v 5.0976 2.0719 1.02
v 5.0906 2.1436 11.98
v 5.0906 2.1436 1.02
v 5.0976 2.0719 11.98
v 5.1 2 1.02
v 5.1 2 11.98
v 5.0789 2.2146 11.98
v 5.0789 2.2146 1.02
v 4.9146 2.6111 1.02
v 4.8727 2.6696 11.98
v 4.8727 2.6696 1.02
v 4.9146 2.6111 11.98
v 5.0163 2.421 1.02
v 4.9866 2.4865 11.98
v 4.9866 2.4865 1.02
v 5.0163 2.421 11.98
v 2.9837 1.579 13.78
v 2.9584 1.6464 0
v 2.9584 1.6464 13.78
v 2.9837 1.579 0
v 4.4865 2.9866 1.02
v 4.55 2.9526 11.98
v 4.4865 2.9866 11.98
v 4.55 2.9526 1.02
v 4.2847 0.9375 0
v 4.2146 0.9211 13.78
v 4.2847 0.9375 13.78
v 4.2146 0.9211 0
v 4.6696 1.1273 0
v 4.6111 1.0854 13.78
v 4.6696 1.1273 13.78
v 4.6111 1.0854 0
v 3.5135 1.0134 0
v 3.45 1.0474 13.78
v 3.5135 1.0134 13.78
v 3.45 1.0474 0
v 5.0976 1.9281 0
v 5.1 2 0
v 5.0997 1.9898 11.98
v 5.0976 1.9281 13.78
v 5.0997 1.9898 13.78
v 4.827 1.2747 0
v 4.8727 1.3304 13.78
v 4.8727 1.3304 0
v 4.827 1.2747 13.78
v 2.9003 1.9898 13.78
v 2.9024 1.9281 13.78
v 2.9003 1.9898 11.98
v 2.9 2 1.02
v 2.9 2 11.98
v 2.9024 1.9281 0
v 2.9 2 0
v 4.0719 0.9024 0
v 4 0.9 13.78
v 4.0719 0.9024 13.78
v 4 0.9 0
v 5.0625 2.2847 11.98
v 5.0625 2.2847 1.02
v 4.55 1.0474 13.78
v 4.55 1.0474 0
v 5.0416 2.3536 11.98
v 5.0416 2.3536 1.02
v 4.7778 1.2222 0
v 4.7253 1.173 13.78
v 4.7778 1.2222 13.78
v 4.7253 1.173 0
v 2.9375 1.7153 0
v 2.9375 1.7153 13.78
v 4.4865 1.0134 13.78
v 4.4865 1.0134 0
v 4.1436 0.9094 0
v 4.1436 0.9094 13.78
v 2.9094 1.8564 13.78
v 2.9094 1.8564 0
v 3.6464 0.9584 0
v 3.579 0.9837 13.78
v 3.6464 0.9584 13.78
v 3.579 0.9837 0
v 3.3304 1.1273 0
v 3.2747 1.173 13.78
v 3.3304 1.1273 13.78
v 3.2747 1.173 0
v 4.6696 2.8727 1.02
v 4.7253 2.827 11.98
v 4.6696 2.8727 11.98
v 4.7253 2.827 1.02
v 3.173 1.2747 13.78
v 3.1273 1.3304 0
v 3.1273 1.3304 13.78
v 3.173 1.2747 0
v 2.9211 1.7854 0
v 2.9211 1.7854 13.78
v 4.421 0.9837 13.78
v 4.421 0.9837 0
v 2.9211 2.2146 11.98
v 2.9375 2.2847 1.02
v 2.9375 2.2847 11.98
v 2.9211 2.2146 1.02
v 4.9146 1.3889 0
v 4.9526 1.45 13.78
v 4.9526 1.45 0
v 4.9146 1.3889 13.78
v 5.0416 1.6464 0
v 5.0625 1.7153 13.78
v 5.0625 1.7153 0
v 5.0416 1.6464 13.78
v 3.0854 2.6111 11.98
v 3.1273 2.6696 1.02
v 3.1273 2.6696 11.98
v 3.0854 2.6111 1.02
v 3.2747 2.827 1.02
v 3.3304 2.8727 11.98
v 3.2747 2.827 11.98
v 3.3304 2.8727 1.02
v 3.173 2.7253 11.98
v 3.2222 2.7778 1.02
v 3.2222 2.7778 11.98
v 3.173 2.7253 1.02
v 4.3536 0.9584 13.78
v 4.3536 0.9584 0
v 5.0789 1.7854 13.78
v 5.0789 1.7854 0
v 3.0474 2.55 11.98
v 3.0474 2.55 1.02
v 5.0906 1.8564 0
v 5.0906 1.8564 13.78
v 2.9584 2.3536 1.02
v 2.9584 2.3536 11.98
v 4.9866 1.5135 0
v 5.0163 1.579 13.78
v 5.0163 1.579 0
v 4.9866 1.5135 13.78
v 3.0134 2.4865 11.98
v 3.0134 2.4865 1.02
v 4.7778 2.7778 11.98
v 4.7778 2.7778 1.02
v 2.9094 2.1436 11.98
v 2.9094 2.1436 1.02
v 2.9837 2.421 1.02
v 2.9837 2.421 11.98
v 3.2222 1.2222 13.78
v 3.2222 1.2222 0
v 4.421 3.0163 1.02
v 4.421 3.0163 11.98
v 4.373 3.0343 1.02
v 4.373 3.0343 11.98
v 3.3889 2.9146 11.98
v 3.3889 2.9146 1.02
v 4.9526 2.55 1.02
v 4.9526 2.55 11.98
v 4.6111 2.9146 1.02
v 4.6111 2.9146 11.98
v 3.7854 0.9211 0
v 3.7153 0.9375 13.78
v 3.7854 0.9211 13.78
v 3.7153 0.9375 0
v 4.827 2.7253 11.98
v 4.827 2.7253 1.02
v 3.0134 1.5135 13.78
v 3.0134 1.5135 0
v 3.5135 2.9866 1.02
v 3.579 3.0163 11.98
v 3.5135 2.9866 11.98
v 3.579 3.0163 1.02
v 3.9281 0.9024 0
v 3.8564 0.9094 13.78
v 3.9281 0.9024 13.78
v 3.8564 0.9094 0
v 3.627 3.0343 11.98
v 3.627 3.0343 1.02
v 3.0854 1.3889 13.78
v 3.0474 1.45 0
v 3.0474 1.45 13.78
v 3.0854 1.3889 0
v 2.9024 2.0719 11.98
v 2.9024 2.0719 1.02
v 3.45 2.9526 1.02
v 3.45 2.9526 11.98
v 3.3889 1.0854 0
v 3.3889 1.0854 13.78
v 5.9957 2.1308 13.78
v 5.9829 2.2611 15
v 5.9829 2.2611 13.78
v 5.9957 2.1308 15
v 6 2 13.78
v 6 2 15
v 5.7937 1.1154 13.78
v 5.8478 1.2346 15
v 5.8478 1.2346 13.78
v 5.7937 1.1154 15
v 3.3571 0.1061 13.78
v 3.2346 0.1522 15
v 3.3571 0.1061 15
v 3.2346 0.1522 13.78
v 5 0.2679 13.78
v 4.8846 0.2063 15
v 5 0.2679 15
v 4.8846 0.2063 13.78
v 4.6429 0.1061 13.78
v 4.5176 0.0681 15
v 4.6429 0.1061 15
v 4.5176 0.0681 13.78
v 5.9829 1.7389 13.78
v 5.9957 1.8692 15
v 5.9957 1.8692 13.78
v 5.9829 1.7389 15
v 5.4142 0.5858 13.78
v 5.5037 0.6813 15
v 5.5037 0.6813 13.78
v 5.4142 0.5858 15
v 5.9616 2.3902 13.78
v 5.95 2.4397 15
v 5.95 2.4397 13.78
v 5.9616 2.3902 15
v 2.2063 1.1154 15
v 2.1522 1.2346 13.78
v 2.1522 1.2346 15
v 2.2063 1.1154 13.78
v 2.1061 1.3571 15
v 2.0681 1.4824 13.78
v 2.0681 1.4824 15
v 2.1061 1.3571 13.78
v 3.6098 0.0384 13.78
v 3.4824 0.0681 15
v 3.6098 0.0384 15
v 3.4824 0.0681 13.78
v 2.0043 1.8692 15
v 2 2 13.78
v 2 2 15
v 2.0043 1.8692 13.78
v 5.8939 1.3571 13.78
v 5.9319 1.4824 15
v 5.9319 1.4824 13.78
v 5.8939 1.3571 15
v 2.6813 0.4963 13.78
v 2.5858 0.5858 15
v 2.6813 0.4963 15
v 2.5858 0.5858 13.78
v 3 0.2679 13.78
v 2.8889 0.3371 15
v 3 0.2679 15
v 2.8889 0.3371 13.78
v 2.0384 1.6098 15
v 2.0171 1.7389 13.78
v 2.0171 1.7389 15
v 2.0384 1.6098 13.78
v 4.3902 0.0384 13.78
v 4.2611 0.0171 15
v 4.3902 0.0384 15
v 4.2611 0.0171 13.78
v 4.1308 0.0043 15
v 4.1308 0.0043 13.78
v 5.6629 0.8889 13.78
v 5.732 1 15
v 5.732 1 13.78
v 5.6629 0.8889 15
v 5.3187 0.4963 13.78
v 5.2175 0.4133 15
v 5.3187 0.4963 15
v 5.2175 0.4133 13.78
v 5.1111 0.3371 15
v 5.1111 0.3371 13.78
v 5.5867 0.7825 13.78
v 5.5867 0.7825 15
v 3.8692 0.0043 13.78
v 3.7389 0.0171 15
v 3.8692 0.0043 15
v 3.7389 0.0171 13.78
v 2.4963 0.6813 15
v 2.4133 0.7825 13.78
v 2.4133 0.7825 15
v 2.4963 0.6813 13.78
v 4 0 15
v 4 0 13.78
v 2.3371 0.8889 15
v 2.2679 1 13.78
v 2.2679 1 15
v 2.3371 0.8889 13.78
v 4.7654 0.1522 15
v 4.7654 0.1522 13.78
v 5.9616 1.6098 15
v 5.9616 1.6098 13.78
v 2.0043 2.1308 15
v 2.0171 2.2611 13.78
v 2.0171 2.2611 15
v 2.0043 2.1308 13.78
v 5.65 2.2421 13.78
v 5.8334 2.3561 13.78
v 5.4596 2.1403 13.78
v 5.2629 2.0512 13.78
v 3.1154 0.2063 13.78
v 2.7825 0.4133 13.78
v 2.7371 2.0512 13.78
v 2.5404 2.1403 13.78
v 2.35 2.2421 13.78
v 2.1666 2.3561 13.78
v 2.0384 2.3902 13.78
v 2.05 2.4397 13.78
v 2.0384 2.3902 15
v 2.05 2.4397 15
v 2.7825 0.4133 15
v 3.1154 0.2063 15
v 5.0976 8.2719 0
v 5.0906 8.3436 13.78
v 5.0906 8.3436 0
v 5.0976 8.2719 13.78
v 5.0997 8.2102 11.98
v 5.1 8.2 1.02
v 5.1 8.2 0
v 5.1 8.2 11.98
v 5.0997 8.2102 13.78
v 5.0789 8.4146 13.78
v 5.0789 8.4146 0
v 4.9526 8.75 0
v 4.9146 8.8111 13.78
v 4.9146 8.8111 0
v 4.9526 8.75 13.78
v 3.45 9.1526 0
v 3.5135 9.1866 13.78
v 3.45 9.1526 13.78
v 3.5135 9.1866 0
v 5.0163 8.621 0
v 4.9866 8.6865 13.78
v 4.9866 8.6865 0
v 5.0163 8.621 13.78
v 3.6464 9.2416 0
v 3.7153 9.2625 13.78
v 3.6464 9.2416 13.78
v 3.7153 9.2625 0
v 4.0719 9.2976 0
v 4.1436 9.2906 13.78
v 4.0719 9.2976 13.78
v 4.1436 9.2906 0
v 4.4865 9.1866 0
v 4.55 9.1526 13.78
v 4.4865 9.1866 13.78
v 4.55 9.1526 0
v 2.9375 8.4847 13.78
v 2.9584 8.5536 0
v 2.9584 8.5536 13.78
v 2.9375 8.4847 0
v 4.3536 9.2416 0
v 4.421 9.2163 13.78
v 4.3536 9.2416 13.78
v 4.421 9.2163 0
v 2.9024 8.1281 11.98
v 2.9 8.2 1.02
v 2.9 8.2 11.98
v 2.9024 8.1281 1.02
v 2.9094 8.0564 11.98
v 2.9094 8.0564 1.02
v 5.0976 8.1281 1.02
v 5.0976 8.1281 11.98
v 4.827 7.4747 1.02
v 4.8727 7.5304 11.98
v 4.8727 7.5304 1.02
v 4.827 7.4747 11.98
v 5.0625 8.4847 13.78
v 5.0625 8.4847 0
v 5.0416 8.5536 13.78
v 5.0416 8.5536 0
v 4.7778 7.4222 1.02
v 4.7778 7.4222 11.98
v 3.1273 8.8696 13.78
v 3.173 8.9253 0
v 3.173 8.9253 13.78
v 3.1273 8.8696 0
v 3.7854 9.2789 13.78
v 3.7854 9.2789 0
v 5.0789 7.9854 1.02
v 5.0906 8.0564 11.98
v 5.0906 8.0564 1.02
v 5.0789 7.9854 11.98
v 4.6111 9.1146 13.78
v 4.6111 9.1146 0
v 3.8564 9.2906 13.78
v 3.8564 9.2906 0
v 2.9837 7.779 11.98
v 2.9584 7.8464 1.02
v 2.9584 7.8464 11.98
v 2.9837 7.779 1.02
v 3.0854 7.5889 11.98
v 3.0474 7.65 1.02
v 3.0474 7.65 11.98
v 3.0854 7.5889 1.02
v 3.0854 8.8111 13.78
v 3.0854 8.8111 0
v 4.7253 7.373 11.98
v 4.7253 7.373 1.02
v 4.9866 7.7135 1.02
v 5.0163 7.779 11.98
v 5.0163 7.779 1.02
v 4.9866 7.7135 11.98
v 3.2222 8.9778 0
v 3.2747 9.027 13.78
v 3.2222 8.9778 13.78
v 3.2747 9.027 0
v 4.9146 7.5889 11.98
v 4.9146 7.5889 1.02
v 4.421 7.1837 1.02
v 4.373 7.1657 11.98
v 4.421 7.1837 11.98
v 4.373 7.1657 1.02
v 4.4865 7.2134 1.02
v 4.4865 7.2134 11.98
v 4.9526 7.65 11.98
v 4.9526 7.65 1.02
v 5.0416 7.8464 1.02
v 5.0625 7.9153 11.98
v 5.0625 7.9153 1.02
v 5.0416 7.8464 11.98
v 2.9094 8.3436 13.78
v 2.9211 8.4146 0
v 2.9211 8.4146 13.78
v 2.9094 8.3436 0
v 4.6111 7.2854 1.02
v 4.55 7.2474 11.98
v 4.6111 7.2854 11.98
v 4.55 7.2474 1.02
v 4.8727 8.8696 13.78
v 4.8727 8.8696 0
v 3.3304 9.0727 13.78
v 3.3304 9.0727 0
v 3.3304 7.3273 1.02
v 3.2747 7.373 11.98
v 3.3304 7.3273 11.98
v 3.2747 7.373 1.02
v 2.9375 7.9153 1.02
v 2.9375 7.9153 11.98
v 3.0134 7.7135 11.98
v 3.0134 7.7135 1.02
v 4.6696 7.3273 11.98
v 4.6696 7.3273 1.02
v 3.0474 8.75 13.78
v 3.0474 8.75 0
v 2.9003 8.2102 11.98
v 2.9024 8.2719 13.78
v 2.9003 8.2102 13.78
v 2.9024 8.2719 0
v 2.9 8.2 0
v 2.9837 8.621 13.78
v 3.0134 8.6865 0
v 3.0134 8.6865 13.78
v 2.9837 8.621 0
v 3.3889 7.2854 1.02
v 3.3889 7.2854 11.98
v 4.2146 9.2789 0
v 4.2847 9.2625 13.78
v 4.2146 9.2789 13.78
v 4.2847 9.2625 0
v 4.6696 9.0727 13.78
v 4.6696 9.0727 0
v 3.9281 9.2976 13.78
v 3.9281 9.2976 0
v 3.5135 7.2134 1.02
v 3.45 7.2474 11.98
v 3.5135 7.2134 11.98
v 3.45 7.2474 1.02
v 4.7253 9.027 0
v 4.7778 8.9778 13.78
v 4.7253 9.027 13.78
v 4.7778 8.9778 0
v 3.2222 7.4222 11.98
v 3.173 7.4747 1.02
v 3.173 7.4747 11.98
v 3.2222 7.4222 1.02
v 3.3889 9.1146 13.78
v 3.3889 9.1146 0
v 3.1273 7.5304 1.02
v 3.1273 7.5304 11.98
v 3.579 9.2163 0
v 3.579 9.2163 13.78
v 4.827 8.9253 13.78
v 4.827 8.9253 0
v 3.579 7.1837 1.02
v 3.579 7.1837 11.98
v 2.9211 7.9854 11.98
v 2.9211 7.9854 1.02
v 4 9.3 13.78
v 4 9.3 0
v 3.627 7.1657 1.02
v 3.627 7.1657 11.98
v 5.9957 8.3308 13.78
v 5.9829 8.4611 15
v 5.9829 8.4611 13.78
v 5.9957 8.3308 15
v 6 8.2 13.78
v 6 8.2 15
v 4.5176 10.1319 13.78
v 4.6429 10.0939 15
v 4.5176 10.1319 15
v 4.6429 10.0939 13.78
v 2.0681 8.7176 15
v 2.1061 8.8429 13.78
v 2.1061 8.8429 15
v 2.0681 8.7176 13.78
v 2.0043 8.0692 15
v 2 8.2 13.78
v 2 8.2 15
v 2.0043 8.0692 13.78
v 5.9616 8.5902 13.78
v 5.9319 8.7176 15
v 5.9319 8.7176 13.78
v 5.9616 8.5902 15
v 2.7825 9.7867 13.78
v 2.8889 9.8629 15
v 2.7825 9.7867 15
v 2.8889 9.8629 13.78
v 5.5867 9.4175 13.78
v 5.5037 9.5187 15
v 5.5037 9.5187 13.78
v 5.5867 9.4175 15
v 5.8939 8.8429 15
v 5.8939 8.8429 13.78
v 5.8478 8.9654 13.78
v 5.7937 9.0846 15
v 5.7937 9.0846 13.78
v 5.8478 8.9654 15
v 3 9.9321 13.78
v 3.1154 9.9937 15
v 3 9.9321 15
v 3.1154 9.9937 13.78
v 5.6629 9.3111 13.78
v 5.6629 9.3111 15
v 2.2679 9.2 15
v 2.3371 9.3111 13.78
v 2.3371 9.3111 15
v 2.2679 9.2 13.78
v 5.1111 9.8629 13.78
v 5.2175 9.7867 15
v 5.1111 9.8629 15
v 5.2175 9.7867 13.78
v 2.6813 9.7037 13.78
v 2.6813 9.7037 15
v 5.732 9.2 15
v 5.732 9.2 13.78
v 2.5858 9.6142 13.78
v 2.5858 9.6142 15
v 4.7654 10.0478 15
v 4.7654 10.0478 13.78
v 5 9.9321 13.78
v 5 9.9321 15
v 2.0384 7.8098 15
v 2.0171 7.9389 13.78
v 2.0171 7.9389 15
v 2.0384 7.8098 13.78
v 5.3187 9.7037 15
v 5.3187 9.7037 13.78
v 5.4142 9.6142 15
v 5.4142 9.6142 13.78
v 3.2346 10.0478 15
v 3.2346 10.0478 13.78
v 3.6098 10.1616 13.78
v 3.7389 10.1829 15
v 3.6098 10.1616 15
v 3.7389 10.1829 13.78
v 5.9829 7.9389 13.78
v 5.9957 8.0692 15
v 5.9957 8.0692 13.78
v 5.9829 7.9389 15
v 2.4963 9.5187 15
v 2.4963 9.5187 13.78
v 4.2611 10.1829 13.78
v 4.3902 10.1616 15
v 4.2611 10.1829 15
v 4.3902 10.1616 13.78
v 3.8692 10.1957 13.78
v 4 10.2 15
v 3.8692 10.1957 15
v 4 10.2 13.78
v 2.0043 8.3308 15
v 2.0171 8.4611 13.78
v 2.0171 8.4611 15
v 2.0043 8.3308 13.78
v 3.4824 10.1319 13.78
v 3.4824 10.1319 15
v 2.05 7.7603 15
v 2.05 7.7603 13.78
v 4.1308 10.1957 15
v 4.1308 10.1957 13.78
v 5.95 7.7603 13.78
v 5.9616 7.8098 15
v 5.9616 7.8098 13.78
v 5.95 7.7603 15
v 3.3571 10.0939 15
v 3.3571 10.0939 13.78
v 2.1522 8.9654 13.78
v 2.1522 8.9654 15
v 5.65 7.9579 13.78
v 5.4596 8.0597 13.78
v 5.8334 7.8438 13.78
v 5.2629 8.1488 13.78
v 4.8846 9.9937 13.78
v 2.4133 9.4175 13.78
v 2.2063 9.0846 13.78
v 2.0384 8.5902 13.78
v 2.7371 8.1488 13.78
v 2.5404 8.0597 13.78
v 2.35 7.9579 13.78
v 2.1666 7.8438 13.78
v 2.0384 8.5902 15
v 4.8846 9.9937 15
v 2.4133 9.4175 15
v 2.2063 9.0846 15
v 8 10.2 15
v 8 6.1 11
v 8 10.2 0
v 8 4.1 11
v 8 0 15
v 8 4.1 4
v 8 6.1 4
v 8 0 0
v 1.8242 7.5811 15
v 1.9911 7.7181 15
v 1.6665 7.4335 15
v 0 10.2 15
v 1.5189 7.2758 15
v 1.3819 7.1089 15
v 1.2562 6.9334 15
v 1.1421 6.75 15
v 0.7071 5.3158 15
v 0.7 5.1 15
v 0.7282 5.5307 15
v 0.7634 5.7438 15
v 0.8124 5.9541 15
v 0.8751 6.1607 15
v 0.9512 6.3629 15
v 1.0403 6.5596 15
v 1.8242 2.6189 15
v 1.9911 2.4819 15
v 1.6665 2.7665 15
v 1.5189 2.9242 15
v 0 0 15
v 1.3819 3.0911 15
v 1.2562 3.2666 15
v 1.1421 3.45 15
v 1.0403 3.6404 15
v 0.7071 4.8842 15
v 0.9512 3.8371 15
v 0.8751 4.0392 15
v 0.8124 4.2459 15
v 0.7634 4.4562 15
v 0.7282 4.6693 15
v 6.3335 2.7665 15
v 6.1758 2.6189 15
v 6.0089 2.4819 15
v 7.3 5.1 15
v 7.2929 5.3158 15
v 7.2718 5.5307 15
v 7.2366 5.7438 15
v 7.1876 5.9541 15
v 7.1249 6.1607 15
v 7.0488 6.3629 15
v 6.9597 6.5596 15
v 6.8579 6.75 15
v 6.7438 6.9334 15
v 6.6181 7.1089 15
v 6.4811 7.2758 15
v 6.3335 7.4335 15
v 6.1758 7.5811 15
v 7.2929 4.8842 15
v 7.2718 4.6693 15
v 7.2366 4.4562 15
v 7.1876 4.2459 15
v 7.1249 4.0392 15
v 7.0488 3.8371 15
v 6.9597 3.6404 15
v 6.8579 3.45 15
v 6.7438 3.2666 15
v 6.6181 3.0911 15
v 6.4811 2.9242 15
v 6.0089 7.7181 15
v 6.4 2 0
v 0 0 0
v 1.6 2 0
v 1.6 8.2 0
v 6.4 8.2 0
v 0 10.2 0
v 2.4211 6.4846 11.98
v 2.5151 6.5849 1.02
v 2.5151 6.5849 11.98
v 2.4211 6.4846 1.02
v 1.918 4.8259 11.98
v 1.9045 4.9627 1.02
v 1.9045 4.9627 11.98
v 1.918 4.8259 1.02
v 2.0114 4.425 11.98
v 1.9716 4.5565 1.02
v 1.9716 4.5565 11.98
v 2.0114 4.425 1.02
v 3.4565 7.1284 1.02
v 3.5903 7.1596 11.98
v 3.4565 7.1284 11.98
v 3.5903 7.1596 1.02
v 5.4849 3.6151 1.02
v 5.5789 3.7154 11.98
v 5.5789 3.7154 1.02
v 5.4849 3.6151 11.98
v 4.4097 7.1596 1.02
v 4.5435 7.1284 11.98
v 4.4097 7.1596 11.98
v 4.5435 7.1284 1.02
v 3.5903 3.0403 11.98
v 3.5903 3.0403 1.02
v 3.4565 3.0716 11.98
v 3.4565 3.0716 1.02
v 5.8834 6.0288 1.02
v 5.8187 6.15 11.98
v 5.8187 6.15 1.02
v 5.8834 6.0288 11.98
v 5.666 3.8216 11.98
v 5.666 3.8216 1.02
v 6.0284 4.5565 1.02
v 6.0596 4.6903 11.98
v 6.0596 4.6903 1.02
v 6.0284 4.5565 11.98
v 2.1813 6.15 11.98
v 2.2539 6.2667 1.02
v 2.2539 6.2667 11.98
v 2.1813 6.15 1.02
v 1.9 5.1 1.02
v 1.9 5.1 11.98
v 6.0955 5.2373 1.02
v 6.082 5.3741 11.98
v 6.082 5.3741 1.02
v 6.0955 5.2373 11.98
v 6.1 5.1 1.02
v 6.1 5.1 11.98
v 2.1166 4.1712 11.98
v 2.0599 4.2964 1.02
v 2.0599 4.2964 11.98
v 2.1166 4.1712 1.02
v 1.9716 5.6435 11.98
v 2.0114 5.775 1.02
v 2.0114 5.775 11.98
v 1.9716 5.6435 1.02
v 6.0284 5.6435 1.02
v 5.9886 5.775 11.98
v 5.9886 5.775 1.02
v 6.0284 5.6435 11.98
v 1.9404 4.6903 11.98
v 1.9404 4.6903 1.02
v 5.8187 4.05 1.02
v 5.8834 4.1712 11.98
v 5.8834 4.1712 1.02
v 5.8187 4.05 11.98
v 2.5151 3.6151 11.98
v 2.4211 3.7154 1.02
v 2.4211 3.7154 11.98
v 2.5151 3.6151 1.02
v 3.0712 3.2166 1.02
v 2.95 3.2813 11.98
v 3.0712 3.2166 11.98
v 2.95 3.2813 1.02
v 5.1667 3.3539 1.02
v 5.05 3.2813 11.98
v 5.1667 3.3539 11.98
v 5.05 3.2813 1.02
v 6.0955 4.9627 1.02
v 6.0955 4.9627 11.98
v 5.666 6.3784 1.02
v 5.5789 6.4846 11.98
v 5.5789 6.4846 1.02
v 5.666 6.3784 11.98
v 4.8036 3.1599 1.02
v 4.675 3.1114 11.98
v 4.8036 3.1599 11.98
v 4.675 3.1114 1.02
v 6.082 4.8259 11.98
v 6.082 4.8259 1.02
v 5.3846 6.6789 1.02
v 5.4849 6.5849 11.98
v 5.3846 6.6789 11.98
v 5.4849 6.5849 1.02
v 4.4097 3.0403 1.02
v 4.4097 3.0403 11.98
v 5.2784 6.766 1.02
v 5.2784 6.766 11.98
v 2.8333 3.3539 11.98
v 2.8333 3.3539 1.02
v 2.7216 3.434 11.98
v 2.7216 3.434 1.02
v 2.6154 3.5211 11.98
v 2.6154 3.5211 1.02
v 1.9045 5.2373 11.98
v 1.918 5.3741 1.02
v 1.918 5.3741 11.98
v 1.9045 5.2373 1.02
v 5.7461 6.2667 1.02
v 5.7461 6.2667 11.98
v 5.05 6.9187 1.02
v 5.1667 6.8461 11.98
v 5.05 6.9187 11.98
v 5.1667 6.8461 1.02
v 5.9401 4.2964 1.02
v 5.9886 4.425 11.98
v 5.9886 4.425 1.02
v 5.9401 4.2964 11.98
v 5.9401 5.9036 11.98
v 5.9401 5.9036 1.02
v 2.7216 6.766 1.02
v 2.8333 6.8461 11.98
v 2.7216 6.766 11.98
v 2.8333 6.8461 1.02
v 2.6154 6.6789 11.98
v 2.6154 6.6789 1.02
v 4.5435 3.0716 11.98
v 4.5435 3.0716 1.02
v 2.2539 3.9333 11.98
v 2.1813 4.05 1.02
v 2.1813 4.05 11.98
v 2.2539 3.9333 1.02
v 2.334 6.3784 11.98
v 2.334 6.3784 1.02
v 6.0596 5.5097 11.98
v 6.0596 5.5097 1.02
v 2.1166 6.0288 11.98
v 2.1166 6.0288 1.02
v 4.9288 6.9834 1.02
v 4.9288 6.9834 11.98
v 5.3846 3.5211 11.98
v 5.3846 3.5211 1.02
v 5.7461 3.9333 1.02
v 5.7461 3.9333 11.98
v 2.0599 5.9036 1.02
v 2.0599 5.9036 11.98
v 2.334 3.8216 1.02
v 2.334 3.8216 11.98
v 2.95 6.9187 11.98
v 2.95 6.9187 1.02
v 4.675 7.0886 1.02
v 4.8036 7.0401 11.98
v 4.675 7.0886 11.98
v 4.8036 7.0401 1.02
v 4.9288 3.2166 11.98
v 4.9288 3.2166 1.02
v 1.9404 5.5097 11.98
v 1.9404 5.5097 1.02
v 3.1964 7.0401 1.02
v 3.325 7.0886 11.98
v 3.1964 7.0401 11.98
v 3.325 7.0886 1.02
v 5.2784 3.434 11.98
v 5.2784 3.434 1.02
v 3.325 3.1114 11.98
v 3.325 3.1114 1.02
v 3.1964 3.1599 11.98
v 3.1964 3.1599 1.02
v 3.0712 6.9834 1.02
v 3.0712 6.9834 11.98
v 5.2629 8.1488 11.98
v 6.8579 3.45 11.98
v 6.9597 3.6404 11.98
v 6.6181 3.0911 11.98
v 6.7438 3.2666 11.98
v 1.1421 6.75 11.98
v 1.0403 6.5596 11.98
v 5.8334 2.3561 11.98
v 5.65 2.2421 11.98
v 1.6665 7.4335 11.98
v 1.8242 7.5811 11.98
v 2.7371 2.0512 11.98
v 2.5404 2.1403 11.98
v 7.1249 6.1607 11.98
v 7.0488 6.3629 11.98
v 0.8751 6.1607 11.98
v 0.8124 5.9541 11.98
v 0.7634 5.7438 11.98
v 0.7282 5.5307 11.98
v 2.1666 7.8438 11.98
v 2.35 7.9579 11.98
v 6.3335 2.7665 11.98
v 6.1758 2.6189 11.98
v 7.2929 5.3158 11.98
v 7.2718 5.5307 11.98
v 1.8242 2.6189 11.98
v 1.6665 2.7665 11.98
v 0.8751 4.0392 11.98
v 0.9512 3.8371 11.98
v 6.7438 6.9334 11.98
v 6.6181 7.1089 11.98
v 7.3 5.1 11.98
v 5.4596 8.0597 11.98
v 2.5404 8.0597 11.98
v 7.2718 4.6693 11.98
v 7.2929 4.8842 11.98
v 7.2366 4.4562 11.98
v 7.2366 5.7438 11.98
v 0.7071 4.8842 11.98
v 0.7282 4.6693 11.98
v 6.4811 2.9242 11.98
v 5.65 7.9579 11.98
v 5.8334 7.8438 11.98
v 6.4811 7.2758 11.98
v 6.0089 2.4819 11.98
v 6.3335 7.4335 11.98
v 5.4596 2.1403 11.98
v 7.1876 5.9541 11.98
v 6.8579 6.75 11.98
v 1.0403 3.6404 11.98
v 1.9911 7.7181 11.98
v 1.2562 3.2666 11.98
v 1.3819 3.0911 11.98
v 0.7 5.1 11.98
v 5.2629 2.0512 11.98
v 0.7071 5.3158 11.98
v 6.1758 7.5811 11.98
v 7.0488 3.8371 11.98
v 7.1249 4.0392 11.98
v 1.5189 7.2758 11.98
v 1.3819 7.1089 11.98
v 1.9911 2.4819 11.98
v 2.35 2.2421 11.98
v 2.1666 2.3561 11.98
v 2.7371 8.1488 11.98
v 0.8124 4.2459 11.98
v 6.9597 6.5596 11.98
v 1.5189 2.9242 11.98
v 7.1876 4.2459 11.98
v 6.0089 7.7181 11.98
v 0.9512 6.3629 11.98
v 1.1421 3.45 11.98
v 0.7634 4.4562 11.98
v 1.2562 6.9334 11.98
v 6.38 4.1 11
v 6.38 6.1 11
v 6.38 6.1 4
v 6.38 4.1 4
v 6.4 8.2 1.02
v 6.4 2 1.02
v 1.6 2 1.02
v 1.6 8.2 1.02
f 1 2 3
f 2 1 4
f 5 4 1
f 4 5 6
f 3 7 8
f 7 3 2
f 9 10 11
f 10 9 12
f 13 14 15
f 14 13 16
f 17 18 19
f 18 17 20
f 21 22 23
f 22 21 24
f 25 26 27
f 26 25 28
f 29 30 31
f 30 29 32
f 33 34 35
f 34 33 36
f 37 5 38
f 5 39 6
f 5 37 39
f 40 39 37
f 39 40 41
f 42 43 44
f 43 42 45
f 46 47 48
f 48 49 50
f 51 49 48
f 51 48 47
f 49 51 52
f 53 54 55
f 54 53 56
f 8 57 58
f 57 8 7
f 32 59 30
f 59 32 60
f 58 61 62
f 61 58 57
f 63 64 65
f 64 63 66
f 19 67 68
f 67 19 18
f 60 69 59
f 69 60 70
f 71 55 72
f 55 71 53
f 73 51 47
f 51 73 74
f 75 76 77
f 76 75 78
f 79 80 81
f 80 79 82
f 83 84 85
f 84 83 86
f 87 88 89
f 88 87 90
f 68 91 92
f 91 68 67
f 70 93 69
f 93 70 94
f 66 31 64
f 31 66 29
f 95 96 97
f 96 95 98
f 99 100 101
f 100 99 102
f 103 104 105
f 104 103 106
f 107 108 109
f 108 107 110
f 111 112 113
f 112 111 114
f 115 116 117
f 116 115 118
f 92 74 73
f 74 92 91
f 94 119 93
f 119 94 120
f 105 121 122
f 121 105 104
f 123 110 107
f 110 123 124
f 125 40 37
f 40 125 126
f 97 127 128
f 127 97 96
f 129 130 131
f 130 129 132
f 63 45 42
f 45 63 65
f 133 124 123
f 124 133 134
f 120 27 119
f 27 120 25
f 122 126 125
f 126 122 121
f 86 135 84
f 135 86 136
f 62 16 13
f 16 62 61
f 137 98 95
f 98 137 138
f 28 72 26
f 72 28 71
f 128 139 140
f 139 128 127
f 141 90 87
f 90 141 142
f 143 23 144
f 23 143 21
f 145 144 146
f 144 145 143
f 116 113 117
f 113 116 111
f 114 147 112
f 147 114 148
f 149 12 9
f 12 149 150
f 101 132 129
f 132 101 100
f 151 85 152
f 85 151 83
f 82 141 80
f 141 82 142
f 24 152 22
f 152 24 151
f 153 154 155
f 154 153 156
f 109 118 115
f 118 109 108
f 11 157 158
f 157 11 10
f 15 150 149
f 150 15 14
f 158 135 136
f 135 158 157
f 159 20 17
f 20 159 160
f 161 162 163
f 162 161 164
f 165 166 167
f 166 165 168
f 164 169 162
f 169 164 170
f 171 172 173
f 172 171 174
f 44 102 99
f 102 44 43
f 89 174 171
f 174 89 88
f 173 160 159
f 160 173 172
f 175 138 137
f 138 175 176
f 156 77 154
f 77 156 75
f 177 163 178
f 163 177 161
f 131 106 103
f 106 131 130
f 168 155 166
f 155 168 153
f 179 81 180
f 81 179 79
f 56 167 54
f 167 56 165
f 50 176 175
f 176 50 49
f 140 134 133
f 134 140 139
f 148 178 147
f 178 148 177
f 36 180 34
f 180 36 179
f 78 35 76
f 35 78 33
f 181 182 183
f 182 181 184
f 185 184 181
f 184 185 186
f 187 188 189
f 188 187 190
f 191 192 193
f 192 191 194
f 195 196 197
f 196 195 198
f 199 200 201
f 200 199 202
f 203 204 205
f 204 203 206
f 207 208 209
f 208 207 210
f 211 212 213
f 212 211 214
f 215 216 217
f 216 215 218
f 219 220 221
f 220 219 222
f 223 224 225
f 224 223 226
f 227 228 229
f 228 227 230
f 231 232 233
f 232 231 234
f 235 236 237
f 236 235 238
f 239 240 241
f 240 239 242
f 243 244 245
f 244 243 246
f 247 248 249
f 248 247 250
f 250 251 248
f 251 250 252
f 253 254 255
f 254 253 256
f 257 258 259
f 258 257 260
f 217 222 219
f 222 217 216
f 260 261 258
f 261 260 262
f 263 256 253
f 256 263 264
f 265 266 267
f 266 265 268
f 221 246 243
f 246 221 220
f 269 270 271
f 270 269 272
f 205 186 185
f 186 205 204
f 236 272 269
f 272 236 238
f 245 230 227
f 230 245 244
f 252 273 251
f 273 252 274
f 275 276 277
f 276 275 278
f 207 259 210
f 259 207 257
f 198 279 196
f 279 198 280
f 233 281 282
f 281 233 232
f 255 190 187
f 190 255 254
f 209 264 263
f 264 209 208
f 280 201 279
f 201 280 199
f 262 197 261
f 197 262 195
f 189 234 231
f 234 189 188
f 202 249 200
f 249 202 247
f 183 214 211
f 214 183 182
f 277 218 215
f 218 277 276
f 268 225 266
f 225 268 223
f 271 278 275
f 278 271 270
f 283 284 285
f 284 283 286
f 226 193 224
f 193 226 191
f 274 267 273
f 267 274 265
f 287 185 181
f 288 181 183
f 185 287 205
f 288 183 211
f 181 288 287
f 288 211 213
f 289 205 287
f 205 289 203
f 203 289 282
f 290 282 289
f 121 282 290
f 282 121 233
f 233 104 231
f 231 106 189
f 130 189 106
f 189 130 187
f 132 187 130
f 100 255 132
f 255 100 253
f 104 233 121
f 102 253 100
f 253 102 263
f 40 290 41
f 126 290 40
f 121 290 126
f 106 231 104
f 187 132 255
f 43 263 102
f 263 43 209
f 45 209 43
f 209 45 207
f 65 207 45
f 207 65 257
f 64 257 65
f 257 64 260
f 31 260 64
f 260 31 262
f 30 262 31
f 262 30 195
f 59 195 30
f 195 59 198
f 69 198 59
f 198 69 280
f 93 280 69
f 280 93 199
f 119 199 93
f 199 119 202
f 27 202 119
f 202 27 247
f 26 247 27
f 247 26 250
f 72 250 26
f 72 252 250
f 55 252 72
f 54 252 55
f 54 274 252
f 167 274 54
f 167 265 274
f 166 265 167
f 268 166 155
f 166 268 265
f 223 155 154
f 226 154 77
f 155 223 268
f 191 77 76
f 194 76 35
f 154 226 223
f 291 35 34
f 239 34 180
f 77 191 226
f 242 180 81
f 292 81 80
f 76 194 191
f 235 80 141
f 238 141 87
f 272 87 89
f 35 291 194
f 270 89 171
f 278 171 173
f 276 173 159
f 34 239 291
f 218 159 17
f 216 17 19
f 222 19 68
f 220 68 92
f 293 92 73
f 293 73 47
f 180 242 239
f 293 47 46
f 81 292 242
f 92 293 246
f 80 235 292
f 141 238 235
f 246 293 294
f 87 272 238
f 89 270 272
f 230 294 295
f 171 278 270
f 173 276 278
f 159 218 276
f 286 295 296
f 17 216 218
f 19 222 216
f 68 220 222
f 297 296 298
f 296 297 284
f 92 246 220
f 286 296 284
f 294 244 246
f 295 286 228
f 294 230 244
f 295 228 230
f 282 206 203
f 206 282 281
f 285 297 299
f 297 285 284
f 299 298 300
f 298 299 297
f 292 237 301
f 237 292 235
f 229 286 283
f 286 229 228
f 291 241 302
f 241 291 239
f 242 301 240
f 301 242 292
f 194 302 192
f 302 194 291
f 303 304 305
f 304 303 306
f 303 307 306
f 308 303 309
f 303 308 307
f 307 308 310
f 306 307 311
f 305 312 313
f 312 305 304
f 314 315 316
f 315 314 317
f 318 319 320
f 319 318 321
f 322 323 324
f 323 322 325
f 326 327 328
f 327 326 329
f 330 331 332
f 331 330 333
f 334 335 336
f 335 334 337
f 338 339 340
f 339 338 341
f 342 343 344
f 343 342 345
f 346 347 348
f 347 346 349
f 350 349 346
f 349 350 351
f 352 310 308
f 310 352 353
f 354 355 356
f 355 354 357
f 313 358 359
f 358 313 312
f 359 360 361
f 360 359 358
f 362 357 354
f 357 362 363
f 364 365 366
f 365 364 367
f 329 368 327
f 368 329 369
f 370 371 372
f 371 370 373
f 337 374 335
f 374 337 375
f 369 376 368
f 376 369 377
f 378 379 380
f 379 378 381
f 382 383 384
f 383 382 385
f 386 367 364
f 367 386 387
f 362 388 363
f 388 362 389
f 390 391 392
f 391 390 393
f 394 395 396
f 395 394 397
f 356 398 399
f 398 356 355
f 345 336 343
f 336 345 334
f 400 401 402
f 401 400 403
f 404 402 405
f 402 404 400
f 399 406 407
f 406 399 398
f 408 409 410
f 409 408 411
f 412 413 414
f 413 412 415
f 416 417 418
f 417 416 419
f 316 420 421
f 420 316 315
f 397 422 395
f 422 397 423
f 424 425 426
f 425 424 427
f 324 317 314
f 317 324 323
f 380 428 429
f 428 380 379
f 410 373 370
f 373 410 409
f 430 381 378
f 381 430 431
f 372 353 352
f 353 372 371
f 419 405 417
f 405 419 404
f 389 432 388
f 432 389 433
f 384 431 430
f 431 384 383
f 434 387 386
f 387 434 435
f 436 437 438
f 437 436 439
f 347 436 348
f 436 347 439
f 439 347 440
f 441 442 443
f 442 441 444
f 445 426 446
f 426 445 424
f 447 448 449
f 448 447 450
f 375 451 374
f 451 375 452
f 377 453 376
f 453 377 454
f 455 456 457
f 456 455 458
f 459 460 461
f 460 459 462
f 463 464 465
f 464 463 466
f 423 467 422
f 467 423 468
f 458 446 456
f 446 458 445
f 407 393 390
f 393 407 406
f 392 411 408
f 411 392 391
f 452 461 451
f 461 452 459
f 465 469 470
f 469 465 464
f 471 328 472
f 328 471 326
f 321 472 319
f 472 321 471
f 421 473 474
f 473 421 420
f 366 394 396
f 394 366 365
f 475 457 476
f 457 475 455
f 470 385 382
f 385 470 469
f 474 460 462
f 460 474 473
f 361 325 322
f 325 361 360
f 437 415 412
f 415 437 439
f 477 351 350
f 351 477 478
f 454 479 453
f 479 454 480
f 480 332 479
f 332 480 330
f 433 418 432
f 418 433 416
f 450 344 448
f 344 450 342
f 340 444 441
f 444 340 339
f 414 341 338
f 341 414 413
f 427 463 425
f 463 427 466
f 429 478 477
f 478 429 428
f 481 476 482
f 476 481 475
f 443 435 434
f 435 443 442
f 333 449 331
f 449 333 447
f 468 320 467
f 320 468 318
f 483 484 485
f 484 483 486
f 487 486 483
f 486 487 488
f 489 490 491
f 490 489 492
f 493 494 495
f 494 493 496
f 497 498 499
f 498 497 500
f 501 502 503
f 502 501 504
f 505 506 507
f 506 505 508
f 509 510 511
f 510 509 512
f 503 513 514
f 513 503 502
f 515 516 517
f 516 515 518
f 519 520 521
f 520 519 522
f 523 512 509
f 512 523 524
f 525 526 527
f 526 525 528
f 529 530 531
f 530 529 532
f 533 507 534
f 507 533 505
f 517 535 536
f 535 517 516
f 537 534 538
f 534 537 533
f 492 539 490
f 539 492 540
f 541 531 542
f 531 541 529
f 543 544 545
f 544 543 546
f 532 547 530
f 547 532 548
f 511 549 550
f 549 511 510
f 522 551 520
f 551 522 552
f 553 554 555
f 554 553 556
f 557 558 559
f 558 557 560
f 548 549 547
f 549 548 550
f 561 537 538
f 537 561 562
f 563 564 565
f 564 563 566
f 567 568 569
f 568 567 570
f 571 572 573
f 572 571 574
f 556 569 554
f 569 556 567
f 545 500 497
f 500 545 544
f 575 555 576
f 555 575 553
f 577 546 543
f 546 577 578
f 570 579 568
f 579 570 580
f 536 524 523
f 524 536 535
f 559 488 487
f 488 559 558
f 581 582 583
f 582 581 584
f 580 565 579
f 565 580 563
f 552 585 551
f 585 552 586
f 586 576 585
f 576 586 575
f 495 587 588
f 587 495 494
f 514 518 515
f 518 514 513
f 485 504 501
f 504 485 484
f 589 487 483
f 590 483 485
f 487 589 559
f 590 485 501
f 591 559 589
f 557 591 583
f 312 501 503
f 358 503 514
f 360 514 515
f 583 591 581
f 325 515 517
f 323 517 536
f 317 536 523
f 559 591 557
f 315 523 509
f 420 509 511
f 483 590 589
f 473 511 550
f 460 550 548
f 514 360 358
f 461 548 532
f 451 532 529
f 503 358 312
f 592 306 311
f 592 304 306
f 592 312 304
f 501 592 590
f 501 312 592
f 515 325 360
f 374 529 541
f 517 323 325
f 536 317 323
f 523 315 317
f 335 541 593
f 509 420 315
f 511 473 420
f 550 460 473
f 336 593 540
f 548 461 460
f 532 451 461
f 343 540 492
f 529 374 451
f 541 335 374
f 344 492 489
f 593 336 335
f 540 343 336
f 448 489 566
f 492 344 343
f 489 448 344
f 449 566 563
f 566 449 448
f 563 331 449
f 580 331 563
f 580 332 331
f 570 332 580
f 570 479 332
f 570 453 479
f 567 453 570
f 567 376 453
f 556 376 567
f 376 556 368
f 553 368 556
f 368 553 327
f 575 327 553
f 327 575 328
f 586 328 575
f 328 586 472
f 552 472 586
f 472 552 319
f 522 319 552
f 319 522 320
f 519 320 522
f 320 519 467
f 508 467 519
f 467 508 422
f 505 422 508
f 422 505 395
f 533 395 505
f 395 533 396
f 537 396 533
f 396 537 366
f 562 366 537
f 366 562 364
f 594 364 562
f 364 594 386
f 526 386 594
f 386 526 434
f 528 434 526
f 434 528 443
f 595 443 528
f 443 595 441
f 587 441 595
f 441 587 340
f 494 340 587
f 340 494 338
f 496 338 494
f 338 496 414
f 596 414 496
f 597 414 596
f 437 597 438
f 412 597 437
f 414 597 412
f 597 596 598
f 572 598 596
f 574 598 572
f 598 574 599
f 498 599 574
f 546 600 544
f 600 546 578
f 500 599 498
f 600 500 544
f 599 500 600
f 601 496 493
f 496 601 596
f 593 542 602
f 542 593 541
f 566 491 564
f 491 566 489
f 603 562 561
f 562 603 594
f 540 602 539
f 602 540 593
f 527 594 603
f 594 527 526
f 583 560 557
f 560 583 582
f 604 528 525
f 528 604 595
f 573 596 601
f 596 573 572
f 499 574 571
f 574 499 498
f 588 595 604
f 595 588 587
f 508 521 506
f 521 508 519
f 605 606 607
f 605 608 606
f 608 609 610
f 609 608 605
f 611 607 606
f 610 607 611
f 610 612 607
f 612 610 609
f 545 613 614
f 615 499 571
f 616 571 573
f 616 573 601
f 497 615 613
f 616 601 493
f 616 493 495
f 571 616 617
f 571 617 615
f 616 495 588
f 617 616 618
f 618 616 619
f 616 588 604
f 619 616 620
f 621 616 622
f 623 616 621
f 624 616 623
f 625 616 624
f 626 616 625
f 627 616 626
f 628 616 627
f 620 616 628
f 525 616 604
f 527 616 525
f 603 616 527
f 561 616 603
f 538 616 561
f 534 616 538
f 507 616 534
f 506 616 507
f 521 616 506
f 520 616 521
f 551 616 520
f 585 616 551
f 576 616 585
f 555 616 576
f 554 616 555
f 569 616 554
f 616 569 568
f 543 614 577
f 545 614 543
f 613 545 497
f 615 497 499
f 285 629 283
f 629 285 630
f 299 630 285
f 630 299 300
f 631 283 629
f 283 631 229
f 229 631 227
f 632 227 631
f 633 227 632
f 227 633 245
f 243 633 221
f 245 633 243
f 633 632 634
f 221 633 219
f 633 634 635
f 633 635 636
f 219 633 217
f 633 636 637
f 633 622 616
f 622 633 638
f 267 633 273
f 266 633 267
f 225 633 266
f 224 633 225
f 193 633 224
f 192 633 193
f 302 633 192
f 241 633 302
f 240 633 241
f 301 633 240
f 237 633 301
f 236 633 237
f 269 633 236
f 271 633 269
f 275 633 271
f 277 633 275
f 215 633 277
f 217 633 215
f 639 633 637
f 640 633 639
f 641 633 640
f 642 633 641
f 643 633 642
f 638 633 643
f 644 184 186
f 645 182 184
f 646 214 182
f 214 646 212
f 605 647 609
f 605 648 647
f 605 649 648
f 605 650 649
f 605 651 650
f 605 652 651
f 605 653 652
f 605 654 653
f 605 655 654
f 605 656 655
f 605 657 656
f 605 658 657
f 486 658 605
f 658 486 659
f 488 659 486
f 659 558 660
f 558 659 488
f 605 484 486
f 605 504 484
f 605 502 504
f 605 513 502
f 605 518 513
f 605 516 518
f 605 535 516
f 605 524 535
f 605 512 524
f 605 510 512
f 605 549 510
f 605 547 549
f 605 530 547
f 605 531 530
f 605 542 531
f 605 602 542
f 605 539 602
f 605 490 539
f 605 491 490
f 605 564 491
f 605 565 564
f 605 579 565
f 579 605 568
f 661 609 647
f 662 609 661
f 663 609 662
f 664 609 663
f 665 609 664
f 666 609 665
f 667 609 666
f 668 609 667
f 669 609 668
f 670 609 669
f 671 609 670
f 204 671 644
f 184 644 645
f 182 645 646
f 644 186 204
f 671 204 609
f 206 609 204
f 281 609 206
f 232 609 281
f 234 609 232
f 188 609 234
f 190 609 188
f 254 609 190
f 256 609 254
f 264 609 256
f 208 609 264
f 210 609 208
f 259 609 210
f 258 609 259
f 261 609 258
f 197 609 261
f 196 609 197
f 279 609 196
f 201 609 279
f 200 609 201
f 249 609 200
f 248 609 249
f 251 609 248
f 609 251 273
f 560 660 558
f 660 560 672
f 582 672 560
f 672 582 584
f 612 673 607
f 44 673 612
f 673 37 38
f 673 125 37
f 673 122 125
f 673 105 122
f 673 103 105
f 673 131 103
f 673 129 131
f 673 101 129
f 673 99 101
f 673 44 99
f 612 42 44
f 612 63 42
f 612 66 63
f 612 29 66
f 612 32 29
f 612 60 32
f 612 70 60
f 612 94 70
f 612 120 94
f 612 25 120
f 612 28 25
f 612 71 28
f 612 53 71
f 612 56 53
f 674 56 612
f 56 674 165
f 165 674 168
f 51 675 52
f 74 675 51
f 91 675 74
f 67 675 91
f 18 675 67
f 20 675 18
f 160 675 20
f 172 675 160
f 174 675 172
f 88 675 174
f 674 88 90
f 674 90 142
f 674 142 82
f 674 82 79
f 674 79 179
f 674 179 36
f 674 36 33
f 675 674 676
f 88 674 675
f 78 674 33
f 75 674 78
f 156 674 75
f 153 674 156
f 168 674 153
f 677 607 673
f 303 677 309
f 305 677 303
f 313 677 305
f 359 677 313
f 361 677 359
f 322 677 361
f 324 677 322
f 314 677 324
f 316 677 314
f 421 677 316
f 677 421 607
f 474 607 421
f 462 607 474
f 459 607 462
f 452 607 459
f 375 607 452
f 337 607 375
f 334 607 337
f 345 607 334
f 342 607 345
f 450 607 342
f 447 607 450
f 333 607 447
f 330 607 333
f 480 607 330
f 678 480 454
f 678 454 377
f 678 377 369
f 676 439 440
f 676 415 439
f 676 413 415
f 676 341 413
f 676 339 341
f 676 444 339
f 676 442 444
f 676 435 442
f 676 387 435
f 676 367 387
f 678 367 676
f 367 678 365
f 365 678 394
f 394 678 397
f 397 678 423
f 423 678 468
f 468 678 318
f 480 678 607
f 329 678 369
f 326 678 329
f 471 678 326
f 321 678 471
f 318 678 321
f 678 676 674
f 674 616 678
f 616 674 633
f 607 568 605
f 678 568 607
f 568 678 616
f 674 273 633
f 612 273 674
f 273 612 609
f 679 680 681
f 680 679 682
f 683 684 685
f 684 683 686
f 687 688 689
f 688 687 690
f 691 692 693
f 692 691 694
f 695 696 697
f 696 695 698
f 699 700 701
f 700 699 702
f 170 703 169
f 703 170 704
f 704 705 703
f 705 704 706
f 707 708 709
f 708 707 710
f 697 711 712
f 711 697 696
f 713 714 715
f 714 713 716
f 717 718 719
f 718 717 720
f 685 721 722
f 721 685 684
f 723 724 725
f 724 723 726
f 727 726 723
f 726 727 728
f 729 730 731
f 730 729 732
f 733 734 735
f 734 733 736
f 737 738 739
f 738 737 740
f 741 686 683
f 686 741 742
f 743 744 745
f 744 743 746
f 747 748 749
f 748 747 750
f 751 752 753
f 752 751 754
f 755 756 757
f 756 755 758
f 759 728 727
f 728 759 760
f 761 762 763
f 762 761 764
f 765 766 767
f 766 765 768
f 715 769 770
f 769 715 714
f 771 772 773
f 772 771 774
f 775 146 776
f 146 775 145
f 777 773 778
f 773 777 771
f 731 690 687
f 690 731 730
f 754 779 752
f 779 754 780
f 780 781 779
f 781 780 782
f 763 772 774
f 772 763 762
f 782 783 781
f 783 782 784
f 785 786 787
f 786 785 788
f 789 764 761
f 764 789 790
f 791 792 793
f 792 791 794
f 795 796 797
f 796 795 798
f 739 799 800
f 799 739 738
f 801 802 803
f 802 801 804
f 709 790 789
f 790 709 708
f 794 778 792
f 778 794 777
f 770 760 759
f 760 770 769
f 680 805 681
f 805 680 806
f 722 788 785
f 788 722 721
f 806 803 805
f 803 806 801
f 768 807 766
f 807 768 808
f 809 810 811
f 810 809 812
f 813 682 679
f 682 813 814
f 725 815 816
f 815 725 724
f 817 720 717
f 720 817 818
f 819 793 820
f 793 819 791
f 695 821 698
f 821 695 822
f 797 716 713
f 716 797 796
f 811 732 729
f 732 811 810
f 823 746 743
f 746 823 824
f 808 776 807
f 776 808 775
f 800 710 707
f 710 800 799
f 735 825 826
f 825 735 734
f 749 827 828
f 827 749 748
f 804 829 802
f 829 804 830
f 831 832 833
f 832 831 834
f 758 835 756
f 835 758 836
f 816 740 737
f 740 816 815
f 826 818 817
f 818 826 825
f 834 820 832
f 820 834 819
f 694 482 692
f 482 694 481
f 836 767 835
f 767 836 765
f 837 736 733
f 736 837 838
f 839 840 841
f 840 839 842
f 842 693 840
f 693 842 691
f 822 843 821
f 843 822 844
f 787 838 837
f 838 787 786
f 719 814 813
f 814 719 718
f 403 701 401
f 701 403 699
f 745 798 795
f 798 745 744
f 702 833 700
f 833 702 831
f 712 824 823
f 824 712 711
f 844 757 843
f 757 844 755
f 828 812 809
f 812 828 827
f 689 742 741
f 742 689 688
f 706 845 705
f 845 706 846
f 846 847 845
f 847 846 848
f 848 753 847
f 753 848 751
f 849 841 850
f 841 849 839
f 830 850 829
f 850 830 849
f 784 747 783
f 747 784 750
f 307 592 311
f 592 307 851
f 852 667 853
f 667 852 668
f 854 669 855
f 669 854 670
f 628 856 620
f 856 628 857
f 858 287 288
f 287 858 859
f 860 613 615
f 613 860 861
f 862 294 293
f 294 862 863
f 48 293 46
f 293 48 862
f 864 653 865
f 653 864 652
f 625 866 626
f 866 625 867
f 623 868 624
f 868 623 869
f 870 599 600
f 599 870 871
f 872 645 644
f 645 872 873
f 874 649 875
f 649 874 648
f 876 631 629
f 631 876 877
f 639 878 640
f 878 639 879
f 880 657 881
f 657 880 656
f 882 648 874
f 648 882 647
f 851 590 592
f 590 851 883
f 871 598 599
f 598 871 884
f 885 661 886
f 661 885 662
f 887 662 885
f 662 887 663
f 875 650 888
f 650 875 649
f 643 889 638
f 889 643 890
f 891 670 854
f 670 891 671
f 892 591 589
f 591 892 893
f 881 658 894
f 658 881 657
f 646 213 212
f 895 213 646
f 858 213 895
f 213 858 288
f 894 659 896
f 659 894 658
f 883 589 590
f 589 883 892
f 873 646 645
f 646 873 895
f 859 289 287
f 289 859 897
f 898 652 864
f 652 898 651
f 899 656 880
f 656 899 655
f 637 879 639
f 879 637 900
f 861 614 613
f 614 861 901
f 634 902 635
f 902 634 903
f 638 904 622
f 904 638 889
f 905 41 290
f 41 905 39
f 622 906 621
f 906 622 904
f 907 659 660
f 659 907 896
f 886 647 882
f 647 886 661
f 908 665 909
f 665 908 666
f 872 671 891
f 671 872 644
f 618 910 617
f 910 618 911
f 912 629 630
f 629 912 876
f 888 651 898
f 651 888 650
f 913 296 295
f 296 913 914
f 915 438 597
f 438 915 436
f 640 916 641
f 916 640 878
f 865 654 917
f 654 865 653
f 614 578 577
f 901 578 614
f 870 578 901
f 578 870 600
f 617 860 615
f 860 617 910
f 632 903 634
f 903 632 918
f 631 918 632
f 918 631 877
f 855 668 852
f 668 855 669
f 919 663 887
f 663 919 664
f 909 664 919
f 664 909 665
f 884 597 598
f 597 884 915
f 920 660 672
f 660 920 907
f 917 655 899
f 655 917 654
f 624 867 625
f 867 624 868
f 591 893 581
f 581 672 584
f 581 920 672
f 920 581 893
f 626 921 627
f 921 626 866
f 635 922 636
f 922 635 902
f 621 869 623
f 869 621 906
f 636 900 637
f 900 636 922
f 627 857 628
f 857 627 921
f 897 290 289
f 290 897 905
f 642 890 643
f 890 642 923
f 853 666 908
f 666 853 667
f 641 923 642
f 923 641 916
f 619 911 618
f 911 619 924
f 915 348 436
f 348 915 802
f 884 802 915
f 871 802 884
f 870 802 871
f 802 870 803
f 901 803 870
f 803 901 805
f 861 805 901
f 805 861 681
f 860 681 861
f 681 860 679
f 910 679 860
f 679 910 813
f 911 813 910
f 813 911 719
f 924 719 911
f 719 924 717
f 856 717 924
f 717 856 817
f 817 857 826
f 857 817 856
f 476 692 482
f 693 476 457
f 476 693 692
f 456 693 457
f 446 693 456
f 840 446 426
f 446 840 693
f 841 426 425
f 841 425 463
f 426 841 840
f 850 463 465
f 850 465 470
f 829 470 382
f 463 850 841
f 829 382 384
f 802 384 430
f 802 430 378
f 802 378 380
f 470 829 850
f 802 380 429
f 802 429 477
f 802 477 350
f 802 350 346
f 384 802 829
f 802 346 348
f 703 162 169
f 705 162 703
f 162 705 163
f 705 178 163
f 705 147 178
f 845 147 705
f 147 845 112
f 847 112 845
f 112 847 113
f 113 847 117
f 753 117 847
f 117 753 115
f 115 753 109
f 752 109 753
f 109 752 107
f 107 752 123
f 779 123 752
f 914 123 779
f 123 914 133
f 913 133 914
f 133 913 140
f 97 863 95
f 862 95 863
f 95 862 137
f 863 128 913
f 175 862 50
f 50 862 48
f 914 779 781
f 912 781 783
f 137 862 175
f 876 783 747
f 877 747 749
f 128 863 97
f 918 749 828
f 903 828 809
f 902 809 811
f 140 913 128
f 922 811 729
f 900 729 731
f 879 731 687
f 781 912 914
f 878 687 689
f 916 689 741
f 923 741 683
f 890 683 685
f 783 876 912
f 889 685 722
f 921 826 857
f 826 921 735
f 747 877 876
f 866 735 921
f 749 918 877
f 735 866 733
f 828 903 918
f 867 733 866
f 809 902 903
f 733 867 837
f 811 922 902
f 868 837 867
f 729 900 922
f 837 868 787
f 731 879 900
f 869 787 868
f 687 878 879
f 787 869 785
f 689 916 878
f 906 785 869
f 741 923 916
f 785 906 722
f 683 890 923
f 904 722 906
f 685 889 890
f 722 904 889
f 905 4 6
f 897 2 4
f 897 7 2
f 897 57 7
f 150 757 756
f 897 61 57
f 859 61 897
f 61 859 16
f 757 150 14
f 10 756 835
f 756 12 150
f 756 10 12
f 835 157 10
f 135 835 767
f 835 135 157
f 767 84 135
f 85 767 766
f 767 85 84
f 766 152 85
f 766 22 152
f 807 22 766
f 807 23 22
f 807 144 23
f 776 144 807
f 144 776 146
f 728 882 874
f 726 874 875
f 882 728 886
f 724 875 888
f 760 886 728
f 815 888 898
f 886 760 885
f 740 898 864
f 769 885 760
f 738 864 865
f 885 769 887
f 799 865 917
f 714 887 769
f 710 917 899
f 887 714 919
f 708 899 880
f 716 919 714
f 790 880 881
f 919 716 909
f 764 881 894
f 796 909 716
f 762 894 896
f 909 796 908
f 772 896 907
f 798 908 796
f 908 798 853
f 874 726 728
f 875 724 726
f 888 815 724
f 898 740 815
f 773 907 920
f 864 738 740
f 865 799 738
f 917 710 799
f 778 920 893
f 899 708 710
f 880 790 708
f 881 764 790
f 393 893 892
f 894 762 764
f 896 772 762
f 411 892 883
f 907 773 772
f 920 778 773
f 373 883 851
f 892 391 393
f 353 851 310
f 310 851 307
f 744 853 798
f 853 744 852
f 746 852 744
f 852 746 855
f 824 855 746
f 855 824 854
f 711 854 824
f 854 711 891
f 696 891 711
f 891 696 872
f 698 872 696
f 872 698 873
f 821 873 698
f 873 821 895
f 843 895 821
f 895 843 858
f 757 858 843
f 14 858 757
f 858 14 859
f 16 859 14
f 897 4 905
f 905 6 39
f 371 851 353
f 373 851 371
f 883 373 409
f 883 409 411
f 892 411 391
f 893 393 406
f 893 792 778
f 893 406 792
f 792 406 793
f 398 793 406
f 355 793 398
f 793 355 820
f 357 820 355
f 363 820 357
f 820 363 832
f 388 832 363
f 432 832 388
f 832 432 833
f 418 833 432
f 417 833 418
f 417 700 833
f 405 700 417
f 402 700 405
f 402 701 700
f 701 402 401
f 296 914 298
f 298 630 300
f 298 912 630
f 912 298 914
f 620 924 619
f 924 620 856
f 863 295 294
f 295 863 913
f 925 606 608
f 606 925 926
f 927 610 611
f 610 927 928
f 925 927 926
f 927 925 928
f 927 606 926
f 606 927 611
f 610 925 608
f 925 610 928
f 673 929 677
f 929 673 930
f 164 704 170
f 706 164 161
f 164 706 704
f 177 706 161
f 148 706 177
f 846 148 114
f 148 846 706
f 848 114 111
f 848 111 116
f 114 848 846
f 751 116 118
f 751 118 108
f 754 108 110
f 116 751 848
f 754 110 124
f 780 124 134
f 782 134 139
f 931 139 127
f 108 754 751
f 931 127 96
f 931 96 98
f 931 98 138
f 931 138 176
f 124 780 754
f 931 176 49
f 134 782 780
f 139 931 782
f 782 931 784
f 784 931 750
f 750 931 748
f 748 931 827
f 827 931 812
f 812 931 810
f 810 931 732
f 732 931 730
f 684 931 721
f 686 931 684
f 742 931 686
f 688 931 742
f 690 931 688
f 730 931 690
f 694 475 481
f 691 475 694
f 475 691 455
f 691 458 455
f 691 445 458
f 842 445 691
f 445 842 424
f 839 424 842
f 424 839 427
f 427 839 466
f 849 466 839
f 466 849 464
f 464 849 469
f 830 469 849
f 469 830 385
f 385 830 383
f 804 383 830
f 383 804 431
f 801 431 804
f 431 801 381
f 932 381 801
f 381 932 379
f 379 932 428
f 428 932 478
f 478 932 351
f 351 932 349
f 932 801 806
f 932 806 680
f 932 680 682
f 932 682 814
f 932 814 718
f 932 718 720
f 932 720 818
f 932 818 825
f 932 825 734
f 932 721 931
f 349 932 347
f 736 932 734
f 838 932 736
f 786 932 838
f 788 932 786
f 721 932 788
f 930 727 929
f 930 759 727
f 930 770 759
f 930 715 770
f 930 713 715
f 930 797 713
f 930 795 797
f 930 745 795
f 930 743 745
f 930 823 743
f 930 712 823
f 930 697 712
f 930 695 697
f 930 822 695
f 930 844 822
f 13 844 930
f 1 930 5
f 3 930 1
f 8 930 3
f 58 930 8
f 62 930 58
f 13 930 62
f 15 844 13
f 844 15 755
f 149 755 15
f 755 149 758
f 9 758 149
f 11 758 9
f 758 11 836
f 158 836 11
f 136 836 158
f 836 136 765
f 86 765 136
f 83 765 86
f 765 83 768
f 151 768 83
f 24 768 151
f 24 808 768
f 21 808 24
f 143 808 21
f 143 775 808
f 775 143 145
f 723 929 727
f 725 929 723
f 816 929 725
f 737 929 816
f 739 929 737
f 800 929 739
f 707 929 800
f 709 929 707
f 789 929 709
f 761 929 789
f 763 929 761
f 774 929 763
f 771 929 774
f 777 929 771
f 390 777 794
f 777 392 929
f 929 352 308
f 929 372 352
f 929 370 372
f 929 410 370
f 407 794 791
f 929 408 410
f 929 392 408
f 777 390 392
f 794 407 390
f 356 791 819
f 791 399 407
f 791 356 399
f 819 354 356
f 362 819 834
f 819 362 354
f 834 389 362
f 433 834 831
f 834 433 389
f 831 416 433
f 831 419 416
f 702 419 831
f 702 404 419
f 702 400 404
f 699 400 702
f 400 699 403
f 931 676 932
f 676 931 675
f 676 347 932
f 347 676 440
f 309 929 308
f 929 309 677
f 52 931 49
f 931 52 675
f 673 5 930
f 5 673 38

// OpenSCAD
$fn = 96;

// Overall block dimensions (X x Y x Z)
block_x = 8.0;
block_y = 10.2;
block_z = 15.0;

// Feature parameters (kept within the block)
bore_d = 4.2;                 // leadscrew/nut bore
counterbore_d = 6.6;          // top pocket for nut flange
counterbore_h = 3.0;

mount_hole_d = 2.2;           // mounting holes
mount_head_d = 4.0;           // shallow head recess
mount_head_h = 1.2;

edge_margin_y = 2.0;

slot_w = 2.0;                 // side access slot to bore
slot_h = 7.0;
slot_depth = 1.6;

eps = 0.02;

// Derived placement (ensure holes stay inside the block)
mount_y_offset = max(0, block_y/2 - edge_margin_y);

difference() {
    // Main housing block (rectangular, correct overall size)
    cube([block_x, block_y, block_z], center=false);

    // Central bore through full height
    translate([block_x/2, block_y/2, -eps])
        cylinder(d=bore_d, h=block_z + 2*eps, center=false);

    // Top counterbore pocket
    translate([block_x/2, block_y/2, block_z - counterbore_h - eps])
        cylinder(d=counterbore_d, h=counterbore_h + 2*eps, center=false);

    // Two mounting holes through height (along Y, symmetric about center)
    for (sy = [-1, 1]) {
        y_pos = block_y/2 + sy * mount_y_offset;

        translate([block_x/2, y_pos, -eps])
            cylinder(d=mount_hole_d, h=block_z + 2*eps, center=false);

        // Shallow head recess on top
        translate([block_x/2, y_pos, block_z - mount_head_h - eps])
            cylinder(d=mount_head_d, h=mount_head_h + 2*eps, center=false);
    }

    // Side access slot from +X face into the bore area
    translate([block_x - slot_depth - eps, block_y/2 - slot_w/2, (block_z - slot_h)/2])
        cube([slot_depth + 2*eps, slot_w, slot_h], center=false);

    // Bottom relief pocket (kept inside block; does not remove entire bottom)
    relief_h = 1.0;
    relief_x = max(0, block_x - 2*slot_depth);
    relief_y = max(0, block_y - 2*edge_margin_y);
    translate([(block_x - relief_x)/2, (block_y - relief_y)/2, -eps])
        cube([relief_x, relief_y, relief_h + 2*eps], center=false);
}
